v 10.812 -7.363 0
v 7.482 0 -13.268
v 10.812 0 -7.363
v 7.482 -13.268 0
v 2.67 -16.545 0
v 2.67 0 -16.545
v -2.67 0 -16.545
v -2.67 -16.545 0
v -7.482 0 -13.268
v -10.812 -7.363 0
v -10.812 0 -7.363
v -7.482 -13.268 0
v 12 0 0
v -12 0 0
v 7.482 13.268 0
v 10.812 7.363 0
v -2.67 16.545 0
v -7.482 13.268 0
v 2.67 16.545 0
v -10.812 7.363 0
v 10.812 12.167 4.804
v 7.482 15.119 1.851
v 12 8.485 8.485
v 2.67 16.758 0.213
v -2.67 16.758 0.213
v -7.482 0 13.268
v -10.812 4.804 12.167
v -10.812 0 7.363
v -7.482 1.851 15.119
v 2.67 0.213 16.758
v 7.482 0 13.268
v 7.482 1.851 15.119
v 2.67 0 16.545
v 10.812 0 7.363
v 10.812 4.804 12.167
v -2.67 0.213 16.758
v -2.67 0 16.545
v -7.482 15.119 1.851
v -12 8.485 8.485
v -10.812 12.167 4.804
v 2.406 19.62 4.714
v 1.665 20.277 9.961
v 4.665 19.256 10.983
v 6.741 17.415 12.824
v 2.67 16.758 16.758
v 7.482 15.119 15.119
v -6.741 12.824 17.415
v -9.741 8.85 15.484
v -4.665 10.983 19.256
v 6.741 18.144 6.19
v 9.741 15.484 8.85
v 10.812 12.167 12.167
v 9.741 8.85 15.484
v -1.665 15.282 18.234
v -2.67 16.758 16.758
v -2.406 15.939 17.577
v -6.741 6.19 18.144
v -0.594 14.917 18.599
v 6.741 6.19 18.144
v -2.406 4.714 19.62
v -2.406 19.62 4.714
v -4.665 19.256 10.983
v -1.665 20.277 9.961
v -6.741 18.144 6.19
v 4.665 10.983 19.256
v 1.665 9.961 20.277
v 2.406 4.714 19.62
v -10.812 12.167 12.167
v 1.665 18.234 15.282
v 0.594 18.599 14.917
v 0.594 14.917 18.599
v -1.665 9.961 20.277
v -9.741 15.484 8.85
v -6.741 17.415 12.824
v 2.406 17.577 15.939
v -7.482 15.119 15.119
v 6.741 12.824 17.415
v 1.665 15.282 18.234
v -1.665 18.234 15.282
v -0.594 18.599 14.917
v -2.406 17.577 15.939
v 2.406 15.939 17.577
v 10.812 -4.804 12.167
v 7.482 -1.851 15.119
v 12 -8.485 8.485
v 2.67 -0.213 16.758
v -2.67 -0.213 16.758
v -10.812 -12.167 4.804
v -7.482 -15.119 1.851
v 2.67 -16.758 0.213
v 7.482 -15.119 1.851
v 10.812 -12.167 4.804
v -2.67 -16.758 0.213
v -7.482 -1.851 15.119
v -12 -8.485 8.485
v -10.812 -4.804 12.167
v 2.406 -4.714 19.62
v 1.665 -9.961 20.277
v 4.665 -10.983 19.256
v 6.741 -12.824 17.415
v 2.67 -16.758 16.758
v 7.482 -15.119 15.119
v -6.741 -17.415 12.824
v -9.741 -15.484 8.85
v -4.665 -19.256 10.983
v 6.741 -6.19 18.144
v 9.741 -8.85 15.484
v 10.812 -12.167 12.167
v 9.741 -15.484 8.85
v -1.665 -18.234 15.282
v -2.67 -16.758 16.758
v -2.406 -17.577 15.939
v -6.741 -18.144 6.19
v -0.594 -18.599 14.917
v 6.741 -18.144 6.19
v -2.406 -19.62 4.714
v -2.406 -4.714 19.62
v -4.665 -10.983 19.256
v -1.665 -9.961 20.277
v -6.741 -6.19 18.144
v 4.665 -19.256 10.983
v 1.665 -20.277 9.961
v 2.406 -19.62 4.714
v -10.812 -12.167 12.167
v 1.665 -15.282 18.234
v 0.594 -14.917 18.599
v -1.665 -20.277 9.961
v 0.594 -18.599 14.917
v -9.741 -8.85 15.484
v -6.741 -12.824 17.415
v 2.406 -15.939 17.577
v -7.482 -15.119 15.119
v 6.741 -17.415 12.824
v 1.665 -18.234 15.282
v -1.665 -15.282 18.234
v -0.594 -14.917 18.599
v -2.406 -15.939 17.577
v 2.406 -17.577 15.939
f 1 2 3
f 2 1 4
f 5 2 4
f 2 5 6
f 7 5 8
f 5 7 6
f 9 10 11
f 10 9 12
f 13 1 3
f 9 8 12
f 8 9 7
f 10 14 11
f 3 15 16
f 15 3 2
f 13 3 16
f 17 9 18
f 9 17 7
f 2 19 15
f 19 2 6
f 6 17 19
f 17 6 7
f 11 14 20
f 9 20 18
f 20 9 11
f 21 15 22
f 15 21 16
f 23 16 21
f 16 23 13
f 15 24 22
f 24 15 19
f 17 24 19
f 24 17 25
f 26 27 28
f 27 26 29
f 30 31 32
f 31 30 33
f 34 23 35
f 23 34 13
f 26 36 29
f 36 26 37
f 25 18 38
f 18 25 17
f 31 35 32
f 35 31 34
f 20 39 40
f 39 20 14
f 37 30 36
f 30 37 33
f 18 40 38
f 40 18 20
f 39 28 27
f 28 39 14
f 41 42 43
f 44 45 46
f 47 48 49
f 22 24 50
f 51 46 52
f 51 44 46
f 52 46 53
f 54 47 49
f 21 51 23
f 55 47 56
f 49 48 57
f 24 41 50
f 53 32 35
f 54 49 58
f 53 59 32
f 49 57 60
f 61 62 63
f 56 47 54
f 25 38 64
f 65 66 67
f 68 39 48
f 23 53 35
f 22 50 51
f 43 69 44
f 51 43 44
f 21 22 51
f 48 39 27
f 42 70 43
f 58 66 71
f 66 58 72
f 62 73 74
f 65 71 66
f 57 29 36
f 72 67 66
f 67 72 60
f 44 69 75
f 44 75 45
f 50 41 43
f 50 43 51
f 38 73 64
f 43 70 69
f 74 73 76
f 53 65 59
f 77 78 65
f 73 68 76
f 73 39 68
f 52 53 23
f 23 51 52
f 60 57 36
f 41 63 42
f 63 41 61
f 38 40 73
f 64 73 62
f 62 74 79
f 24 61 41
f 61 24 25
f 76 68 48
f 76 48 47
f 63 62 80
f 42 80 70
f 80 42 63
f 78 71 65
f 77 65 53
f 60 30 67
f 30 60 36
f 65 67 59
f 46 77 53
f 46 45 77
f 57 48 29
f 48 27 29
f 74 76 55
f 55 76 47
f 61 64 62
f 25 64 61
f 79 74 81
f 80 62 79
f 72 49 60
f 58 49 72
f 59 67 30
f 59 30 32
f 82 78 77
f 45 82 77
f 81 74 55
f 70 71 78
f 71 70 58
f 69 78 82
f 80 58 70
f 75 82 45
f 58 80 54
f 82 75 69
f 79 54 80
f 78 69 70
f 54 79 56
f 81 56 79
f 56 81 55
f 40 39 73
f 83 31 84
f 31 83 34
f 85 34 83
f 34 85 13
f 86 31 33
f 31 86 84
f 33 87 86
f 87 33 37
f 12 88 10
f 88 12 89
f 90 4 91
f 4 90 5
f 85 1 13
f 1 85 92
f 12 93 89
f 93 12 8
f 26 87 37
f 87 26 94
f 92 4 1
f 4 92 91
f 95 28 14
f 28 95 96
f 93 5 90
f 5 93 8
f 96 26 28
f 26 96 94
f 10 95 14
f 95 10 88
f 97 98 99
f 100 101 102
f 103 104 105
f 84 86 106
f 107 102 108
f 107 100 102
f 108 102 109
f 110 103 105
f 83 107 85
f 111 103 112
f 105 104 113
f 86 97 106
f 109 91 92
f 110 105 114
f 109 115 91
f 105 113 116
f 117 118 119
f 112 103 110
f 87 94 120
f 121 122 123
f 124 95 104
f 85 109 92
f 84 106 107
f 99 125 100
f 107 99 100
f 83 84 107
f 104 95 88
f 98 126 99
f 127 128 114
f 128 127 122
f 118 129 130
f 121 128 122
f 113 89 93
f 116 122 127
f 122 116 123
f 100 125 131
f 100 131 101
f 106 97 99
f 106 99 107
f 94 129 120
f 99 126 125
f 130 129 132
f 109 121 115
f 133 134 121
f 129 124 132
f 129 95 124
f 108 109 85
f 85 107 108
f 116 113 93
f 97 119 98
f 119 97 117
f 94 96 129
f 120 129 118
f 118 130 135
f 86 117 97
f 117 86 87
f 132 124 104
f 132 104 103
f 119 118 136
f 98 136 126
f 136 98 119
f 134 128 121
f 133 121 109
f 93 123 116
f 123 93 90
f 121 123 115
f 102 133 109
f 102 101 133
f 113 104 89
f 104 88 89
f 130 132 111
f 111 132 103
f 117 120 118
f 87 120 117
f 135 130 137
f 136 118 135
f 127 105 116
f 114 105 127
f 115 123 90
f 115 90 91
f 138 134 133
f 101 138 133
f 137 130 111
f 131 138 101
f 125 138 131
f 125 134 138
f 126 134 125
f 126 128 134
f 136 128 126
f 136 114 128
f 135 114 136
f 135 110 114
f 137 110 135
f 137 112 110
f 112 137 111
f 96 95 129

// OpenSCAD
// fn is recommended = x*4 + 2 (6,10,14,18,22,126)
// 10 is best
$fn = 14;

//radius
size = 12;

// how high it bounces
bounce = 20;

// how many degrees of rotation, and how many times it should do this through a loop
rotation = 180;
rotationTimes = 3;

pi = 3.14159265359;

// lock view
$vpt = [0,0,bounce/2];

/////////////////////////////////////////////////////////////
// IMPLEMENTING BOUNCE
// try to use 1 variable between 0-1, and make the function go up and down
function bounce () = 3;

// square function for bounce, implements 1 bounce over the entire period
// (-$t*($t-1))*bounce*4

//sine function for bounce, lags, implements multiple bounces
// floor(sin($t*10)*50+60)

translate([0,0,(-$t*($t-1))*bounce*4])
rotate([0,0,$t*180])

//////////////////////////////////////////////////////////

color("red", 1)
union(){
    intersection() {
        rotate(a=45, v = [1,0,0])
            cylinder(r = size, h = size*2, center = true);

        rotate(a=-45, v = [1,0,0])
            cylinder( r = size, h = size*2, center = true);
    };

    for(i = [-1:2:1]){
        rotate(a=45*i, v = [1,0,0])
        union(){
            cylinder(r = size, h = size, center = false);
            
            translate([0,0,size]) 
            sphere(size);
        }
    }
}
